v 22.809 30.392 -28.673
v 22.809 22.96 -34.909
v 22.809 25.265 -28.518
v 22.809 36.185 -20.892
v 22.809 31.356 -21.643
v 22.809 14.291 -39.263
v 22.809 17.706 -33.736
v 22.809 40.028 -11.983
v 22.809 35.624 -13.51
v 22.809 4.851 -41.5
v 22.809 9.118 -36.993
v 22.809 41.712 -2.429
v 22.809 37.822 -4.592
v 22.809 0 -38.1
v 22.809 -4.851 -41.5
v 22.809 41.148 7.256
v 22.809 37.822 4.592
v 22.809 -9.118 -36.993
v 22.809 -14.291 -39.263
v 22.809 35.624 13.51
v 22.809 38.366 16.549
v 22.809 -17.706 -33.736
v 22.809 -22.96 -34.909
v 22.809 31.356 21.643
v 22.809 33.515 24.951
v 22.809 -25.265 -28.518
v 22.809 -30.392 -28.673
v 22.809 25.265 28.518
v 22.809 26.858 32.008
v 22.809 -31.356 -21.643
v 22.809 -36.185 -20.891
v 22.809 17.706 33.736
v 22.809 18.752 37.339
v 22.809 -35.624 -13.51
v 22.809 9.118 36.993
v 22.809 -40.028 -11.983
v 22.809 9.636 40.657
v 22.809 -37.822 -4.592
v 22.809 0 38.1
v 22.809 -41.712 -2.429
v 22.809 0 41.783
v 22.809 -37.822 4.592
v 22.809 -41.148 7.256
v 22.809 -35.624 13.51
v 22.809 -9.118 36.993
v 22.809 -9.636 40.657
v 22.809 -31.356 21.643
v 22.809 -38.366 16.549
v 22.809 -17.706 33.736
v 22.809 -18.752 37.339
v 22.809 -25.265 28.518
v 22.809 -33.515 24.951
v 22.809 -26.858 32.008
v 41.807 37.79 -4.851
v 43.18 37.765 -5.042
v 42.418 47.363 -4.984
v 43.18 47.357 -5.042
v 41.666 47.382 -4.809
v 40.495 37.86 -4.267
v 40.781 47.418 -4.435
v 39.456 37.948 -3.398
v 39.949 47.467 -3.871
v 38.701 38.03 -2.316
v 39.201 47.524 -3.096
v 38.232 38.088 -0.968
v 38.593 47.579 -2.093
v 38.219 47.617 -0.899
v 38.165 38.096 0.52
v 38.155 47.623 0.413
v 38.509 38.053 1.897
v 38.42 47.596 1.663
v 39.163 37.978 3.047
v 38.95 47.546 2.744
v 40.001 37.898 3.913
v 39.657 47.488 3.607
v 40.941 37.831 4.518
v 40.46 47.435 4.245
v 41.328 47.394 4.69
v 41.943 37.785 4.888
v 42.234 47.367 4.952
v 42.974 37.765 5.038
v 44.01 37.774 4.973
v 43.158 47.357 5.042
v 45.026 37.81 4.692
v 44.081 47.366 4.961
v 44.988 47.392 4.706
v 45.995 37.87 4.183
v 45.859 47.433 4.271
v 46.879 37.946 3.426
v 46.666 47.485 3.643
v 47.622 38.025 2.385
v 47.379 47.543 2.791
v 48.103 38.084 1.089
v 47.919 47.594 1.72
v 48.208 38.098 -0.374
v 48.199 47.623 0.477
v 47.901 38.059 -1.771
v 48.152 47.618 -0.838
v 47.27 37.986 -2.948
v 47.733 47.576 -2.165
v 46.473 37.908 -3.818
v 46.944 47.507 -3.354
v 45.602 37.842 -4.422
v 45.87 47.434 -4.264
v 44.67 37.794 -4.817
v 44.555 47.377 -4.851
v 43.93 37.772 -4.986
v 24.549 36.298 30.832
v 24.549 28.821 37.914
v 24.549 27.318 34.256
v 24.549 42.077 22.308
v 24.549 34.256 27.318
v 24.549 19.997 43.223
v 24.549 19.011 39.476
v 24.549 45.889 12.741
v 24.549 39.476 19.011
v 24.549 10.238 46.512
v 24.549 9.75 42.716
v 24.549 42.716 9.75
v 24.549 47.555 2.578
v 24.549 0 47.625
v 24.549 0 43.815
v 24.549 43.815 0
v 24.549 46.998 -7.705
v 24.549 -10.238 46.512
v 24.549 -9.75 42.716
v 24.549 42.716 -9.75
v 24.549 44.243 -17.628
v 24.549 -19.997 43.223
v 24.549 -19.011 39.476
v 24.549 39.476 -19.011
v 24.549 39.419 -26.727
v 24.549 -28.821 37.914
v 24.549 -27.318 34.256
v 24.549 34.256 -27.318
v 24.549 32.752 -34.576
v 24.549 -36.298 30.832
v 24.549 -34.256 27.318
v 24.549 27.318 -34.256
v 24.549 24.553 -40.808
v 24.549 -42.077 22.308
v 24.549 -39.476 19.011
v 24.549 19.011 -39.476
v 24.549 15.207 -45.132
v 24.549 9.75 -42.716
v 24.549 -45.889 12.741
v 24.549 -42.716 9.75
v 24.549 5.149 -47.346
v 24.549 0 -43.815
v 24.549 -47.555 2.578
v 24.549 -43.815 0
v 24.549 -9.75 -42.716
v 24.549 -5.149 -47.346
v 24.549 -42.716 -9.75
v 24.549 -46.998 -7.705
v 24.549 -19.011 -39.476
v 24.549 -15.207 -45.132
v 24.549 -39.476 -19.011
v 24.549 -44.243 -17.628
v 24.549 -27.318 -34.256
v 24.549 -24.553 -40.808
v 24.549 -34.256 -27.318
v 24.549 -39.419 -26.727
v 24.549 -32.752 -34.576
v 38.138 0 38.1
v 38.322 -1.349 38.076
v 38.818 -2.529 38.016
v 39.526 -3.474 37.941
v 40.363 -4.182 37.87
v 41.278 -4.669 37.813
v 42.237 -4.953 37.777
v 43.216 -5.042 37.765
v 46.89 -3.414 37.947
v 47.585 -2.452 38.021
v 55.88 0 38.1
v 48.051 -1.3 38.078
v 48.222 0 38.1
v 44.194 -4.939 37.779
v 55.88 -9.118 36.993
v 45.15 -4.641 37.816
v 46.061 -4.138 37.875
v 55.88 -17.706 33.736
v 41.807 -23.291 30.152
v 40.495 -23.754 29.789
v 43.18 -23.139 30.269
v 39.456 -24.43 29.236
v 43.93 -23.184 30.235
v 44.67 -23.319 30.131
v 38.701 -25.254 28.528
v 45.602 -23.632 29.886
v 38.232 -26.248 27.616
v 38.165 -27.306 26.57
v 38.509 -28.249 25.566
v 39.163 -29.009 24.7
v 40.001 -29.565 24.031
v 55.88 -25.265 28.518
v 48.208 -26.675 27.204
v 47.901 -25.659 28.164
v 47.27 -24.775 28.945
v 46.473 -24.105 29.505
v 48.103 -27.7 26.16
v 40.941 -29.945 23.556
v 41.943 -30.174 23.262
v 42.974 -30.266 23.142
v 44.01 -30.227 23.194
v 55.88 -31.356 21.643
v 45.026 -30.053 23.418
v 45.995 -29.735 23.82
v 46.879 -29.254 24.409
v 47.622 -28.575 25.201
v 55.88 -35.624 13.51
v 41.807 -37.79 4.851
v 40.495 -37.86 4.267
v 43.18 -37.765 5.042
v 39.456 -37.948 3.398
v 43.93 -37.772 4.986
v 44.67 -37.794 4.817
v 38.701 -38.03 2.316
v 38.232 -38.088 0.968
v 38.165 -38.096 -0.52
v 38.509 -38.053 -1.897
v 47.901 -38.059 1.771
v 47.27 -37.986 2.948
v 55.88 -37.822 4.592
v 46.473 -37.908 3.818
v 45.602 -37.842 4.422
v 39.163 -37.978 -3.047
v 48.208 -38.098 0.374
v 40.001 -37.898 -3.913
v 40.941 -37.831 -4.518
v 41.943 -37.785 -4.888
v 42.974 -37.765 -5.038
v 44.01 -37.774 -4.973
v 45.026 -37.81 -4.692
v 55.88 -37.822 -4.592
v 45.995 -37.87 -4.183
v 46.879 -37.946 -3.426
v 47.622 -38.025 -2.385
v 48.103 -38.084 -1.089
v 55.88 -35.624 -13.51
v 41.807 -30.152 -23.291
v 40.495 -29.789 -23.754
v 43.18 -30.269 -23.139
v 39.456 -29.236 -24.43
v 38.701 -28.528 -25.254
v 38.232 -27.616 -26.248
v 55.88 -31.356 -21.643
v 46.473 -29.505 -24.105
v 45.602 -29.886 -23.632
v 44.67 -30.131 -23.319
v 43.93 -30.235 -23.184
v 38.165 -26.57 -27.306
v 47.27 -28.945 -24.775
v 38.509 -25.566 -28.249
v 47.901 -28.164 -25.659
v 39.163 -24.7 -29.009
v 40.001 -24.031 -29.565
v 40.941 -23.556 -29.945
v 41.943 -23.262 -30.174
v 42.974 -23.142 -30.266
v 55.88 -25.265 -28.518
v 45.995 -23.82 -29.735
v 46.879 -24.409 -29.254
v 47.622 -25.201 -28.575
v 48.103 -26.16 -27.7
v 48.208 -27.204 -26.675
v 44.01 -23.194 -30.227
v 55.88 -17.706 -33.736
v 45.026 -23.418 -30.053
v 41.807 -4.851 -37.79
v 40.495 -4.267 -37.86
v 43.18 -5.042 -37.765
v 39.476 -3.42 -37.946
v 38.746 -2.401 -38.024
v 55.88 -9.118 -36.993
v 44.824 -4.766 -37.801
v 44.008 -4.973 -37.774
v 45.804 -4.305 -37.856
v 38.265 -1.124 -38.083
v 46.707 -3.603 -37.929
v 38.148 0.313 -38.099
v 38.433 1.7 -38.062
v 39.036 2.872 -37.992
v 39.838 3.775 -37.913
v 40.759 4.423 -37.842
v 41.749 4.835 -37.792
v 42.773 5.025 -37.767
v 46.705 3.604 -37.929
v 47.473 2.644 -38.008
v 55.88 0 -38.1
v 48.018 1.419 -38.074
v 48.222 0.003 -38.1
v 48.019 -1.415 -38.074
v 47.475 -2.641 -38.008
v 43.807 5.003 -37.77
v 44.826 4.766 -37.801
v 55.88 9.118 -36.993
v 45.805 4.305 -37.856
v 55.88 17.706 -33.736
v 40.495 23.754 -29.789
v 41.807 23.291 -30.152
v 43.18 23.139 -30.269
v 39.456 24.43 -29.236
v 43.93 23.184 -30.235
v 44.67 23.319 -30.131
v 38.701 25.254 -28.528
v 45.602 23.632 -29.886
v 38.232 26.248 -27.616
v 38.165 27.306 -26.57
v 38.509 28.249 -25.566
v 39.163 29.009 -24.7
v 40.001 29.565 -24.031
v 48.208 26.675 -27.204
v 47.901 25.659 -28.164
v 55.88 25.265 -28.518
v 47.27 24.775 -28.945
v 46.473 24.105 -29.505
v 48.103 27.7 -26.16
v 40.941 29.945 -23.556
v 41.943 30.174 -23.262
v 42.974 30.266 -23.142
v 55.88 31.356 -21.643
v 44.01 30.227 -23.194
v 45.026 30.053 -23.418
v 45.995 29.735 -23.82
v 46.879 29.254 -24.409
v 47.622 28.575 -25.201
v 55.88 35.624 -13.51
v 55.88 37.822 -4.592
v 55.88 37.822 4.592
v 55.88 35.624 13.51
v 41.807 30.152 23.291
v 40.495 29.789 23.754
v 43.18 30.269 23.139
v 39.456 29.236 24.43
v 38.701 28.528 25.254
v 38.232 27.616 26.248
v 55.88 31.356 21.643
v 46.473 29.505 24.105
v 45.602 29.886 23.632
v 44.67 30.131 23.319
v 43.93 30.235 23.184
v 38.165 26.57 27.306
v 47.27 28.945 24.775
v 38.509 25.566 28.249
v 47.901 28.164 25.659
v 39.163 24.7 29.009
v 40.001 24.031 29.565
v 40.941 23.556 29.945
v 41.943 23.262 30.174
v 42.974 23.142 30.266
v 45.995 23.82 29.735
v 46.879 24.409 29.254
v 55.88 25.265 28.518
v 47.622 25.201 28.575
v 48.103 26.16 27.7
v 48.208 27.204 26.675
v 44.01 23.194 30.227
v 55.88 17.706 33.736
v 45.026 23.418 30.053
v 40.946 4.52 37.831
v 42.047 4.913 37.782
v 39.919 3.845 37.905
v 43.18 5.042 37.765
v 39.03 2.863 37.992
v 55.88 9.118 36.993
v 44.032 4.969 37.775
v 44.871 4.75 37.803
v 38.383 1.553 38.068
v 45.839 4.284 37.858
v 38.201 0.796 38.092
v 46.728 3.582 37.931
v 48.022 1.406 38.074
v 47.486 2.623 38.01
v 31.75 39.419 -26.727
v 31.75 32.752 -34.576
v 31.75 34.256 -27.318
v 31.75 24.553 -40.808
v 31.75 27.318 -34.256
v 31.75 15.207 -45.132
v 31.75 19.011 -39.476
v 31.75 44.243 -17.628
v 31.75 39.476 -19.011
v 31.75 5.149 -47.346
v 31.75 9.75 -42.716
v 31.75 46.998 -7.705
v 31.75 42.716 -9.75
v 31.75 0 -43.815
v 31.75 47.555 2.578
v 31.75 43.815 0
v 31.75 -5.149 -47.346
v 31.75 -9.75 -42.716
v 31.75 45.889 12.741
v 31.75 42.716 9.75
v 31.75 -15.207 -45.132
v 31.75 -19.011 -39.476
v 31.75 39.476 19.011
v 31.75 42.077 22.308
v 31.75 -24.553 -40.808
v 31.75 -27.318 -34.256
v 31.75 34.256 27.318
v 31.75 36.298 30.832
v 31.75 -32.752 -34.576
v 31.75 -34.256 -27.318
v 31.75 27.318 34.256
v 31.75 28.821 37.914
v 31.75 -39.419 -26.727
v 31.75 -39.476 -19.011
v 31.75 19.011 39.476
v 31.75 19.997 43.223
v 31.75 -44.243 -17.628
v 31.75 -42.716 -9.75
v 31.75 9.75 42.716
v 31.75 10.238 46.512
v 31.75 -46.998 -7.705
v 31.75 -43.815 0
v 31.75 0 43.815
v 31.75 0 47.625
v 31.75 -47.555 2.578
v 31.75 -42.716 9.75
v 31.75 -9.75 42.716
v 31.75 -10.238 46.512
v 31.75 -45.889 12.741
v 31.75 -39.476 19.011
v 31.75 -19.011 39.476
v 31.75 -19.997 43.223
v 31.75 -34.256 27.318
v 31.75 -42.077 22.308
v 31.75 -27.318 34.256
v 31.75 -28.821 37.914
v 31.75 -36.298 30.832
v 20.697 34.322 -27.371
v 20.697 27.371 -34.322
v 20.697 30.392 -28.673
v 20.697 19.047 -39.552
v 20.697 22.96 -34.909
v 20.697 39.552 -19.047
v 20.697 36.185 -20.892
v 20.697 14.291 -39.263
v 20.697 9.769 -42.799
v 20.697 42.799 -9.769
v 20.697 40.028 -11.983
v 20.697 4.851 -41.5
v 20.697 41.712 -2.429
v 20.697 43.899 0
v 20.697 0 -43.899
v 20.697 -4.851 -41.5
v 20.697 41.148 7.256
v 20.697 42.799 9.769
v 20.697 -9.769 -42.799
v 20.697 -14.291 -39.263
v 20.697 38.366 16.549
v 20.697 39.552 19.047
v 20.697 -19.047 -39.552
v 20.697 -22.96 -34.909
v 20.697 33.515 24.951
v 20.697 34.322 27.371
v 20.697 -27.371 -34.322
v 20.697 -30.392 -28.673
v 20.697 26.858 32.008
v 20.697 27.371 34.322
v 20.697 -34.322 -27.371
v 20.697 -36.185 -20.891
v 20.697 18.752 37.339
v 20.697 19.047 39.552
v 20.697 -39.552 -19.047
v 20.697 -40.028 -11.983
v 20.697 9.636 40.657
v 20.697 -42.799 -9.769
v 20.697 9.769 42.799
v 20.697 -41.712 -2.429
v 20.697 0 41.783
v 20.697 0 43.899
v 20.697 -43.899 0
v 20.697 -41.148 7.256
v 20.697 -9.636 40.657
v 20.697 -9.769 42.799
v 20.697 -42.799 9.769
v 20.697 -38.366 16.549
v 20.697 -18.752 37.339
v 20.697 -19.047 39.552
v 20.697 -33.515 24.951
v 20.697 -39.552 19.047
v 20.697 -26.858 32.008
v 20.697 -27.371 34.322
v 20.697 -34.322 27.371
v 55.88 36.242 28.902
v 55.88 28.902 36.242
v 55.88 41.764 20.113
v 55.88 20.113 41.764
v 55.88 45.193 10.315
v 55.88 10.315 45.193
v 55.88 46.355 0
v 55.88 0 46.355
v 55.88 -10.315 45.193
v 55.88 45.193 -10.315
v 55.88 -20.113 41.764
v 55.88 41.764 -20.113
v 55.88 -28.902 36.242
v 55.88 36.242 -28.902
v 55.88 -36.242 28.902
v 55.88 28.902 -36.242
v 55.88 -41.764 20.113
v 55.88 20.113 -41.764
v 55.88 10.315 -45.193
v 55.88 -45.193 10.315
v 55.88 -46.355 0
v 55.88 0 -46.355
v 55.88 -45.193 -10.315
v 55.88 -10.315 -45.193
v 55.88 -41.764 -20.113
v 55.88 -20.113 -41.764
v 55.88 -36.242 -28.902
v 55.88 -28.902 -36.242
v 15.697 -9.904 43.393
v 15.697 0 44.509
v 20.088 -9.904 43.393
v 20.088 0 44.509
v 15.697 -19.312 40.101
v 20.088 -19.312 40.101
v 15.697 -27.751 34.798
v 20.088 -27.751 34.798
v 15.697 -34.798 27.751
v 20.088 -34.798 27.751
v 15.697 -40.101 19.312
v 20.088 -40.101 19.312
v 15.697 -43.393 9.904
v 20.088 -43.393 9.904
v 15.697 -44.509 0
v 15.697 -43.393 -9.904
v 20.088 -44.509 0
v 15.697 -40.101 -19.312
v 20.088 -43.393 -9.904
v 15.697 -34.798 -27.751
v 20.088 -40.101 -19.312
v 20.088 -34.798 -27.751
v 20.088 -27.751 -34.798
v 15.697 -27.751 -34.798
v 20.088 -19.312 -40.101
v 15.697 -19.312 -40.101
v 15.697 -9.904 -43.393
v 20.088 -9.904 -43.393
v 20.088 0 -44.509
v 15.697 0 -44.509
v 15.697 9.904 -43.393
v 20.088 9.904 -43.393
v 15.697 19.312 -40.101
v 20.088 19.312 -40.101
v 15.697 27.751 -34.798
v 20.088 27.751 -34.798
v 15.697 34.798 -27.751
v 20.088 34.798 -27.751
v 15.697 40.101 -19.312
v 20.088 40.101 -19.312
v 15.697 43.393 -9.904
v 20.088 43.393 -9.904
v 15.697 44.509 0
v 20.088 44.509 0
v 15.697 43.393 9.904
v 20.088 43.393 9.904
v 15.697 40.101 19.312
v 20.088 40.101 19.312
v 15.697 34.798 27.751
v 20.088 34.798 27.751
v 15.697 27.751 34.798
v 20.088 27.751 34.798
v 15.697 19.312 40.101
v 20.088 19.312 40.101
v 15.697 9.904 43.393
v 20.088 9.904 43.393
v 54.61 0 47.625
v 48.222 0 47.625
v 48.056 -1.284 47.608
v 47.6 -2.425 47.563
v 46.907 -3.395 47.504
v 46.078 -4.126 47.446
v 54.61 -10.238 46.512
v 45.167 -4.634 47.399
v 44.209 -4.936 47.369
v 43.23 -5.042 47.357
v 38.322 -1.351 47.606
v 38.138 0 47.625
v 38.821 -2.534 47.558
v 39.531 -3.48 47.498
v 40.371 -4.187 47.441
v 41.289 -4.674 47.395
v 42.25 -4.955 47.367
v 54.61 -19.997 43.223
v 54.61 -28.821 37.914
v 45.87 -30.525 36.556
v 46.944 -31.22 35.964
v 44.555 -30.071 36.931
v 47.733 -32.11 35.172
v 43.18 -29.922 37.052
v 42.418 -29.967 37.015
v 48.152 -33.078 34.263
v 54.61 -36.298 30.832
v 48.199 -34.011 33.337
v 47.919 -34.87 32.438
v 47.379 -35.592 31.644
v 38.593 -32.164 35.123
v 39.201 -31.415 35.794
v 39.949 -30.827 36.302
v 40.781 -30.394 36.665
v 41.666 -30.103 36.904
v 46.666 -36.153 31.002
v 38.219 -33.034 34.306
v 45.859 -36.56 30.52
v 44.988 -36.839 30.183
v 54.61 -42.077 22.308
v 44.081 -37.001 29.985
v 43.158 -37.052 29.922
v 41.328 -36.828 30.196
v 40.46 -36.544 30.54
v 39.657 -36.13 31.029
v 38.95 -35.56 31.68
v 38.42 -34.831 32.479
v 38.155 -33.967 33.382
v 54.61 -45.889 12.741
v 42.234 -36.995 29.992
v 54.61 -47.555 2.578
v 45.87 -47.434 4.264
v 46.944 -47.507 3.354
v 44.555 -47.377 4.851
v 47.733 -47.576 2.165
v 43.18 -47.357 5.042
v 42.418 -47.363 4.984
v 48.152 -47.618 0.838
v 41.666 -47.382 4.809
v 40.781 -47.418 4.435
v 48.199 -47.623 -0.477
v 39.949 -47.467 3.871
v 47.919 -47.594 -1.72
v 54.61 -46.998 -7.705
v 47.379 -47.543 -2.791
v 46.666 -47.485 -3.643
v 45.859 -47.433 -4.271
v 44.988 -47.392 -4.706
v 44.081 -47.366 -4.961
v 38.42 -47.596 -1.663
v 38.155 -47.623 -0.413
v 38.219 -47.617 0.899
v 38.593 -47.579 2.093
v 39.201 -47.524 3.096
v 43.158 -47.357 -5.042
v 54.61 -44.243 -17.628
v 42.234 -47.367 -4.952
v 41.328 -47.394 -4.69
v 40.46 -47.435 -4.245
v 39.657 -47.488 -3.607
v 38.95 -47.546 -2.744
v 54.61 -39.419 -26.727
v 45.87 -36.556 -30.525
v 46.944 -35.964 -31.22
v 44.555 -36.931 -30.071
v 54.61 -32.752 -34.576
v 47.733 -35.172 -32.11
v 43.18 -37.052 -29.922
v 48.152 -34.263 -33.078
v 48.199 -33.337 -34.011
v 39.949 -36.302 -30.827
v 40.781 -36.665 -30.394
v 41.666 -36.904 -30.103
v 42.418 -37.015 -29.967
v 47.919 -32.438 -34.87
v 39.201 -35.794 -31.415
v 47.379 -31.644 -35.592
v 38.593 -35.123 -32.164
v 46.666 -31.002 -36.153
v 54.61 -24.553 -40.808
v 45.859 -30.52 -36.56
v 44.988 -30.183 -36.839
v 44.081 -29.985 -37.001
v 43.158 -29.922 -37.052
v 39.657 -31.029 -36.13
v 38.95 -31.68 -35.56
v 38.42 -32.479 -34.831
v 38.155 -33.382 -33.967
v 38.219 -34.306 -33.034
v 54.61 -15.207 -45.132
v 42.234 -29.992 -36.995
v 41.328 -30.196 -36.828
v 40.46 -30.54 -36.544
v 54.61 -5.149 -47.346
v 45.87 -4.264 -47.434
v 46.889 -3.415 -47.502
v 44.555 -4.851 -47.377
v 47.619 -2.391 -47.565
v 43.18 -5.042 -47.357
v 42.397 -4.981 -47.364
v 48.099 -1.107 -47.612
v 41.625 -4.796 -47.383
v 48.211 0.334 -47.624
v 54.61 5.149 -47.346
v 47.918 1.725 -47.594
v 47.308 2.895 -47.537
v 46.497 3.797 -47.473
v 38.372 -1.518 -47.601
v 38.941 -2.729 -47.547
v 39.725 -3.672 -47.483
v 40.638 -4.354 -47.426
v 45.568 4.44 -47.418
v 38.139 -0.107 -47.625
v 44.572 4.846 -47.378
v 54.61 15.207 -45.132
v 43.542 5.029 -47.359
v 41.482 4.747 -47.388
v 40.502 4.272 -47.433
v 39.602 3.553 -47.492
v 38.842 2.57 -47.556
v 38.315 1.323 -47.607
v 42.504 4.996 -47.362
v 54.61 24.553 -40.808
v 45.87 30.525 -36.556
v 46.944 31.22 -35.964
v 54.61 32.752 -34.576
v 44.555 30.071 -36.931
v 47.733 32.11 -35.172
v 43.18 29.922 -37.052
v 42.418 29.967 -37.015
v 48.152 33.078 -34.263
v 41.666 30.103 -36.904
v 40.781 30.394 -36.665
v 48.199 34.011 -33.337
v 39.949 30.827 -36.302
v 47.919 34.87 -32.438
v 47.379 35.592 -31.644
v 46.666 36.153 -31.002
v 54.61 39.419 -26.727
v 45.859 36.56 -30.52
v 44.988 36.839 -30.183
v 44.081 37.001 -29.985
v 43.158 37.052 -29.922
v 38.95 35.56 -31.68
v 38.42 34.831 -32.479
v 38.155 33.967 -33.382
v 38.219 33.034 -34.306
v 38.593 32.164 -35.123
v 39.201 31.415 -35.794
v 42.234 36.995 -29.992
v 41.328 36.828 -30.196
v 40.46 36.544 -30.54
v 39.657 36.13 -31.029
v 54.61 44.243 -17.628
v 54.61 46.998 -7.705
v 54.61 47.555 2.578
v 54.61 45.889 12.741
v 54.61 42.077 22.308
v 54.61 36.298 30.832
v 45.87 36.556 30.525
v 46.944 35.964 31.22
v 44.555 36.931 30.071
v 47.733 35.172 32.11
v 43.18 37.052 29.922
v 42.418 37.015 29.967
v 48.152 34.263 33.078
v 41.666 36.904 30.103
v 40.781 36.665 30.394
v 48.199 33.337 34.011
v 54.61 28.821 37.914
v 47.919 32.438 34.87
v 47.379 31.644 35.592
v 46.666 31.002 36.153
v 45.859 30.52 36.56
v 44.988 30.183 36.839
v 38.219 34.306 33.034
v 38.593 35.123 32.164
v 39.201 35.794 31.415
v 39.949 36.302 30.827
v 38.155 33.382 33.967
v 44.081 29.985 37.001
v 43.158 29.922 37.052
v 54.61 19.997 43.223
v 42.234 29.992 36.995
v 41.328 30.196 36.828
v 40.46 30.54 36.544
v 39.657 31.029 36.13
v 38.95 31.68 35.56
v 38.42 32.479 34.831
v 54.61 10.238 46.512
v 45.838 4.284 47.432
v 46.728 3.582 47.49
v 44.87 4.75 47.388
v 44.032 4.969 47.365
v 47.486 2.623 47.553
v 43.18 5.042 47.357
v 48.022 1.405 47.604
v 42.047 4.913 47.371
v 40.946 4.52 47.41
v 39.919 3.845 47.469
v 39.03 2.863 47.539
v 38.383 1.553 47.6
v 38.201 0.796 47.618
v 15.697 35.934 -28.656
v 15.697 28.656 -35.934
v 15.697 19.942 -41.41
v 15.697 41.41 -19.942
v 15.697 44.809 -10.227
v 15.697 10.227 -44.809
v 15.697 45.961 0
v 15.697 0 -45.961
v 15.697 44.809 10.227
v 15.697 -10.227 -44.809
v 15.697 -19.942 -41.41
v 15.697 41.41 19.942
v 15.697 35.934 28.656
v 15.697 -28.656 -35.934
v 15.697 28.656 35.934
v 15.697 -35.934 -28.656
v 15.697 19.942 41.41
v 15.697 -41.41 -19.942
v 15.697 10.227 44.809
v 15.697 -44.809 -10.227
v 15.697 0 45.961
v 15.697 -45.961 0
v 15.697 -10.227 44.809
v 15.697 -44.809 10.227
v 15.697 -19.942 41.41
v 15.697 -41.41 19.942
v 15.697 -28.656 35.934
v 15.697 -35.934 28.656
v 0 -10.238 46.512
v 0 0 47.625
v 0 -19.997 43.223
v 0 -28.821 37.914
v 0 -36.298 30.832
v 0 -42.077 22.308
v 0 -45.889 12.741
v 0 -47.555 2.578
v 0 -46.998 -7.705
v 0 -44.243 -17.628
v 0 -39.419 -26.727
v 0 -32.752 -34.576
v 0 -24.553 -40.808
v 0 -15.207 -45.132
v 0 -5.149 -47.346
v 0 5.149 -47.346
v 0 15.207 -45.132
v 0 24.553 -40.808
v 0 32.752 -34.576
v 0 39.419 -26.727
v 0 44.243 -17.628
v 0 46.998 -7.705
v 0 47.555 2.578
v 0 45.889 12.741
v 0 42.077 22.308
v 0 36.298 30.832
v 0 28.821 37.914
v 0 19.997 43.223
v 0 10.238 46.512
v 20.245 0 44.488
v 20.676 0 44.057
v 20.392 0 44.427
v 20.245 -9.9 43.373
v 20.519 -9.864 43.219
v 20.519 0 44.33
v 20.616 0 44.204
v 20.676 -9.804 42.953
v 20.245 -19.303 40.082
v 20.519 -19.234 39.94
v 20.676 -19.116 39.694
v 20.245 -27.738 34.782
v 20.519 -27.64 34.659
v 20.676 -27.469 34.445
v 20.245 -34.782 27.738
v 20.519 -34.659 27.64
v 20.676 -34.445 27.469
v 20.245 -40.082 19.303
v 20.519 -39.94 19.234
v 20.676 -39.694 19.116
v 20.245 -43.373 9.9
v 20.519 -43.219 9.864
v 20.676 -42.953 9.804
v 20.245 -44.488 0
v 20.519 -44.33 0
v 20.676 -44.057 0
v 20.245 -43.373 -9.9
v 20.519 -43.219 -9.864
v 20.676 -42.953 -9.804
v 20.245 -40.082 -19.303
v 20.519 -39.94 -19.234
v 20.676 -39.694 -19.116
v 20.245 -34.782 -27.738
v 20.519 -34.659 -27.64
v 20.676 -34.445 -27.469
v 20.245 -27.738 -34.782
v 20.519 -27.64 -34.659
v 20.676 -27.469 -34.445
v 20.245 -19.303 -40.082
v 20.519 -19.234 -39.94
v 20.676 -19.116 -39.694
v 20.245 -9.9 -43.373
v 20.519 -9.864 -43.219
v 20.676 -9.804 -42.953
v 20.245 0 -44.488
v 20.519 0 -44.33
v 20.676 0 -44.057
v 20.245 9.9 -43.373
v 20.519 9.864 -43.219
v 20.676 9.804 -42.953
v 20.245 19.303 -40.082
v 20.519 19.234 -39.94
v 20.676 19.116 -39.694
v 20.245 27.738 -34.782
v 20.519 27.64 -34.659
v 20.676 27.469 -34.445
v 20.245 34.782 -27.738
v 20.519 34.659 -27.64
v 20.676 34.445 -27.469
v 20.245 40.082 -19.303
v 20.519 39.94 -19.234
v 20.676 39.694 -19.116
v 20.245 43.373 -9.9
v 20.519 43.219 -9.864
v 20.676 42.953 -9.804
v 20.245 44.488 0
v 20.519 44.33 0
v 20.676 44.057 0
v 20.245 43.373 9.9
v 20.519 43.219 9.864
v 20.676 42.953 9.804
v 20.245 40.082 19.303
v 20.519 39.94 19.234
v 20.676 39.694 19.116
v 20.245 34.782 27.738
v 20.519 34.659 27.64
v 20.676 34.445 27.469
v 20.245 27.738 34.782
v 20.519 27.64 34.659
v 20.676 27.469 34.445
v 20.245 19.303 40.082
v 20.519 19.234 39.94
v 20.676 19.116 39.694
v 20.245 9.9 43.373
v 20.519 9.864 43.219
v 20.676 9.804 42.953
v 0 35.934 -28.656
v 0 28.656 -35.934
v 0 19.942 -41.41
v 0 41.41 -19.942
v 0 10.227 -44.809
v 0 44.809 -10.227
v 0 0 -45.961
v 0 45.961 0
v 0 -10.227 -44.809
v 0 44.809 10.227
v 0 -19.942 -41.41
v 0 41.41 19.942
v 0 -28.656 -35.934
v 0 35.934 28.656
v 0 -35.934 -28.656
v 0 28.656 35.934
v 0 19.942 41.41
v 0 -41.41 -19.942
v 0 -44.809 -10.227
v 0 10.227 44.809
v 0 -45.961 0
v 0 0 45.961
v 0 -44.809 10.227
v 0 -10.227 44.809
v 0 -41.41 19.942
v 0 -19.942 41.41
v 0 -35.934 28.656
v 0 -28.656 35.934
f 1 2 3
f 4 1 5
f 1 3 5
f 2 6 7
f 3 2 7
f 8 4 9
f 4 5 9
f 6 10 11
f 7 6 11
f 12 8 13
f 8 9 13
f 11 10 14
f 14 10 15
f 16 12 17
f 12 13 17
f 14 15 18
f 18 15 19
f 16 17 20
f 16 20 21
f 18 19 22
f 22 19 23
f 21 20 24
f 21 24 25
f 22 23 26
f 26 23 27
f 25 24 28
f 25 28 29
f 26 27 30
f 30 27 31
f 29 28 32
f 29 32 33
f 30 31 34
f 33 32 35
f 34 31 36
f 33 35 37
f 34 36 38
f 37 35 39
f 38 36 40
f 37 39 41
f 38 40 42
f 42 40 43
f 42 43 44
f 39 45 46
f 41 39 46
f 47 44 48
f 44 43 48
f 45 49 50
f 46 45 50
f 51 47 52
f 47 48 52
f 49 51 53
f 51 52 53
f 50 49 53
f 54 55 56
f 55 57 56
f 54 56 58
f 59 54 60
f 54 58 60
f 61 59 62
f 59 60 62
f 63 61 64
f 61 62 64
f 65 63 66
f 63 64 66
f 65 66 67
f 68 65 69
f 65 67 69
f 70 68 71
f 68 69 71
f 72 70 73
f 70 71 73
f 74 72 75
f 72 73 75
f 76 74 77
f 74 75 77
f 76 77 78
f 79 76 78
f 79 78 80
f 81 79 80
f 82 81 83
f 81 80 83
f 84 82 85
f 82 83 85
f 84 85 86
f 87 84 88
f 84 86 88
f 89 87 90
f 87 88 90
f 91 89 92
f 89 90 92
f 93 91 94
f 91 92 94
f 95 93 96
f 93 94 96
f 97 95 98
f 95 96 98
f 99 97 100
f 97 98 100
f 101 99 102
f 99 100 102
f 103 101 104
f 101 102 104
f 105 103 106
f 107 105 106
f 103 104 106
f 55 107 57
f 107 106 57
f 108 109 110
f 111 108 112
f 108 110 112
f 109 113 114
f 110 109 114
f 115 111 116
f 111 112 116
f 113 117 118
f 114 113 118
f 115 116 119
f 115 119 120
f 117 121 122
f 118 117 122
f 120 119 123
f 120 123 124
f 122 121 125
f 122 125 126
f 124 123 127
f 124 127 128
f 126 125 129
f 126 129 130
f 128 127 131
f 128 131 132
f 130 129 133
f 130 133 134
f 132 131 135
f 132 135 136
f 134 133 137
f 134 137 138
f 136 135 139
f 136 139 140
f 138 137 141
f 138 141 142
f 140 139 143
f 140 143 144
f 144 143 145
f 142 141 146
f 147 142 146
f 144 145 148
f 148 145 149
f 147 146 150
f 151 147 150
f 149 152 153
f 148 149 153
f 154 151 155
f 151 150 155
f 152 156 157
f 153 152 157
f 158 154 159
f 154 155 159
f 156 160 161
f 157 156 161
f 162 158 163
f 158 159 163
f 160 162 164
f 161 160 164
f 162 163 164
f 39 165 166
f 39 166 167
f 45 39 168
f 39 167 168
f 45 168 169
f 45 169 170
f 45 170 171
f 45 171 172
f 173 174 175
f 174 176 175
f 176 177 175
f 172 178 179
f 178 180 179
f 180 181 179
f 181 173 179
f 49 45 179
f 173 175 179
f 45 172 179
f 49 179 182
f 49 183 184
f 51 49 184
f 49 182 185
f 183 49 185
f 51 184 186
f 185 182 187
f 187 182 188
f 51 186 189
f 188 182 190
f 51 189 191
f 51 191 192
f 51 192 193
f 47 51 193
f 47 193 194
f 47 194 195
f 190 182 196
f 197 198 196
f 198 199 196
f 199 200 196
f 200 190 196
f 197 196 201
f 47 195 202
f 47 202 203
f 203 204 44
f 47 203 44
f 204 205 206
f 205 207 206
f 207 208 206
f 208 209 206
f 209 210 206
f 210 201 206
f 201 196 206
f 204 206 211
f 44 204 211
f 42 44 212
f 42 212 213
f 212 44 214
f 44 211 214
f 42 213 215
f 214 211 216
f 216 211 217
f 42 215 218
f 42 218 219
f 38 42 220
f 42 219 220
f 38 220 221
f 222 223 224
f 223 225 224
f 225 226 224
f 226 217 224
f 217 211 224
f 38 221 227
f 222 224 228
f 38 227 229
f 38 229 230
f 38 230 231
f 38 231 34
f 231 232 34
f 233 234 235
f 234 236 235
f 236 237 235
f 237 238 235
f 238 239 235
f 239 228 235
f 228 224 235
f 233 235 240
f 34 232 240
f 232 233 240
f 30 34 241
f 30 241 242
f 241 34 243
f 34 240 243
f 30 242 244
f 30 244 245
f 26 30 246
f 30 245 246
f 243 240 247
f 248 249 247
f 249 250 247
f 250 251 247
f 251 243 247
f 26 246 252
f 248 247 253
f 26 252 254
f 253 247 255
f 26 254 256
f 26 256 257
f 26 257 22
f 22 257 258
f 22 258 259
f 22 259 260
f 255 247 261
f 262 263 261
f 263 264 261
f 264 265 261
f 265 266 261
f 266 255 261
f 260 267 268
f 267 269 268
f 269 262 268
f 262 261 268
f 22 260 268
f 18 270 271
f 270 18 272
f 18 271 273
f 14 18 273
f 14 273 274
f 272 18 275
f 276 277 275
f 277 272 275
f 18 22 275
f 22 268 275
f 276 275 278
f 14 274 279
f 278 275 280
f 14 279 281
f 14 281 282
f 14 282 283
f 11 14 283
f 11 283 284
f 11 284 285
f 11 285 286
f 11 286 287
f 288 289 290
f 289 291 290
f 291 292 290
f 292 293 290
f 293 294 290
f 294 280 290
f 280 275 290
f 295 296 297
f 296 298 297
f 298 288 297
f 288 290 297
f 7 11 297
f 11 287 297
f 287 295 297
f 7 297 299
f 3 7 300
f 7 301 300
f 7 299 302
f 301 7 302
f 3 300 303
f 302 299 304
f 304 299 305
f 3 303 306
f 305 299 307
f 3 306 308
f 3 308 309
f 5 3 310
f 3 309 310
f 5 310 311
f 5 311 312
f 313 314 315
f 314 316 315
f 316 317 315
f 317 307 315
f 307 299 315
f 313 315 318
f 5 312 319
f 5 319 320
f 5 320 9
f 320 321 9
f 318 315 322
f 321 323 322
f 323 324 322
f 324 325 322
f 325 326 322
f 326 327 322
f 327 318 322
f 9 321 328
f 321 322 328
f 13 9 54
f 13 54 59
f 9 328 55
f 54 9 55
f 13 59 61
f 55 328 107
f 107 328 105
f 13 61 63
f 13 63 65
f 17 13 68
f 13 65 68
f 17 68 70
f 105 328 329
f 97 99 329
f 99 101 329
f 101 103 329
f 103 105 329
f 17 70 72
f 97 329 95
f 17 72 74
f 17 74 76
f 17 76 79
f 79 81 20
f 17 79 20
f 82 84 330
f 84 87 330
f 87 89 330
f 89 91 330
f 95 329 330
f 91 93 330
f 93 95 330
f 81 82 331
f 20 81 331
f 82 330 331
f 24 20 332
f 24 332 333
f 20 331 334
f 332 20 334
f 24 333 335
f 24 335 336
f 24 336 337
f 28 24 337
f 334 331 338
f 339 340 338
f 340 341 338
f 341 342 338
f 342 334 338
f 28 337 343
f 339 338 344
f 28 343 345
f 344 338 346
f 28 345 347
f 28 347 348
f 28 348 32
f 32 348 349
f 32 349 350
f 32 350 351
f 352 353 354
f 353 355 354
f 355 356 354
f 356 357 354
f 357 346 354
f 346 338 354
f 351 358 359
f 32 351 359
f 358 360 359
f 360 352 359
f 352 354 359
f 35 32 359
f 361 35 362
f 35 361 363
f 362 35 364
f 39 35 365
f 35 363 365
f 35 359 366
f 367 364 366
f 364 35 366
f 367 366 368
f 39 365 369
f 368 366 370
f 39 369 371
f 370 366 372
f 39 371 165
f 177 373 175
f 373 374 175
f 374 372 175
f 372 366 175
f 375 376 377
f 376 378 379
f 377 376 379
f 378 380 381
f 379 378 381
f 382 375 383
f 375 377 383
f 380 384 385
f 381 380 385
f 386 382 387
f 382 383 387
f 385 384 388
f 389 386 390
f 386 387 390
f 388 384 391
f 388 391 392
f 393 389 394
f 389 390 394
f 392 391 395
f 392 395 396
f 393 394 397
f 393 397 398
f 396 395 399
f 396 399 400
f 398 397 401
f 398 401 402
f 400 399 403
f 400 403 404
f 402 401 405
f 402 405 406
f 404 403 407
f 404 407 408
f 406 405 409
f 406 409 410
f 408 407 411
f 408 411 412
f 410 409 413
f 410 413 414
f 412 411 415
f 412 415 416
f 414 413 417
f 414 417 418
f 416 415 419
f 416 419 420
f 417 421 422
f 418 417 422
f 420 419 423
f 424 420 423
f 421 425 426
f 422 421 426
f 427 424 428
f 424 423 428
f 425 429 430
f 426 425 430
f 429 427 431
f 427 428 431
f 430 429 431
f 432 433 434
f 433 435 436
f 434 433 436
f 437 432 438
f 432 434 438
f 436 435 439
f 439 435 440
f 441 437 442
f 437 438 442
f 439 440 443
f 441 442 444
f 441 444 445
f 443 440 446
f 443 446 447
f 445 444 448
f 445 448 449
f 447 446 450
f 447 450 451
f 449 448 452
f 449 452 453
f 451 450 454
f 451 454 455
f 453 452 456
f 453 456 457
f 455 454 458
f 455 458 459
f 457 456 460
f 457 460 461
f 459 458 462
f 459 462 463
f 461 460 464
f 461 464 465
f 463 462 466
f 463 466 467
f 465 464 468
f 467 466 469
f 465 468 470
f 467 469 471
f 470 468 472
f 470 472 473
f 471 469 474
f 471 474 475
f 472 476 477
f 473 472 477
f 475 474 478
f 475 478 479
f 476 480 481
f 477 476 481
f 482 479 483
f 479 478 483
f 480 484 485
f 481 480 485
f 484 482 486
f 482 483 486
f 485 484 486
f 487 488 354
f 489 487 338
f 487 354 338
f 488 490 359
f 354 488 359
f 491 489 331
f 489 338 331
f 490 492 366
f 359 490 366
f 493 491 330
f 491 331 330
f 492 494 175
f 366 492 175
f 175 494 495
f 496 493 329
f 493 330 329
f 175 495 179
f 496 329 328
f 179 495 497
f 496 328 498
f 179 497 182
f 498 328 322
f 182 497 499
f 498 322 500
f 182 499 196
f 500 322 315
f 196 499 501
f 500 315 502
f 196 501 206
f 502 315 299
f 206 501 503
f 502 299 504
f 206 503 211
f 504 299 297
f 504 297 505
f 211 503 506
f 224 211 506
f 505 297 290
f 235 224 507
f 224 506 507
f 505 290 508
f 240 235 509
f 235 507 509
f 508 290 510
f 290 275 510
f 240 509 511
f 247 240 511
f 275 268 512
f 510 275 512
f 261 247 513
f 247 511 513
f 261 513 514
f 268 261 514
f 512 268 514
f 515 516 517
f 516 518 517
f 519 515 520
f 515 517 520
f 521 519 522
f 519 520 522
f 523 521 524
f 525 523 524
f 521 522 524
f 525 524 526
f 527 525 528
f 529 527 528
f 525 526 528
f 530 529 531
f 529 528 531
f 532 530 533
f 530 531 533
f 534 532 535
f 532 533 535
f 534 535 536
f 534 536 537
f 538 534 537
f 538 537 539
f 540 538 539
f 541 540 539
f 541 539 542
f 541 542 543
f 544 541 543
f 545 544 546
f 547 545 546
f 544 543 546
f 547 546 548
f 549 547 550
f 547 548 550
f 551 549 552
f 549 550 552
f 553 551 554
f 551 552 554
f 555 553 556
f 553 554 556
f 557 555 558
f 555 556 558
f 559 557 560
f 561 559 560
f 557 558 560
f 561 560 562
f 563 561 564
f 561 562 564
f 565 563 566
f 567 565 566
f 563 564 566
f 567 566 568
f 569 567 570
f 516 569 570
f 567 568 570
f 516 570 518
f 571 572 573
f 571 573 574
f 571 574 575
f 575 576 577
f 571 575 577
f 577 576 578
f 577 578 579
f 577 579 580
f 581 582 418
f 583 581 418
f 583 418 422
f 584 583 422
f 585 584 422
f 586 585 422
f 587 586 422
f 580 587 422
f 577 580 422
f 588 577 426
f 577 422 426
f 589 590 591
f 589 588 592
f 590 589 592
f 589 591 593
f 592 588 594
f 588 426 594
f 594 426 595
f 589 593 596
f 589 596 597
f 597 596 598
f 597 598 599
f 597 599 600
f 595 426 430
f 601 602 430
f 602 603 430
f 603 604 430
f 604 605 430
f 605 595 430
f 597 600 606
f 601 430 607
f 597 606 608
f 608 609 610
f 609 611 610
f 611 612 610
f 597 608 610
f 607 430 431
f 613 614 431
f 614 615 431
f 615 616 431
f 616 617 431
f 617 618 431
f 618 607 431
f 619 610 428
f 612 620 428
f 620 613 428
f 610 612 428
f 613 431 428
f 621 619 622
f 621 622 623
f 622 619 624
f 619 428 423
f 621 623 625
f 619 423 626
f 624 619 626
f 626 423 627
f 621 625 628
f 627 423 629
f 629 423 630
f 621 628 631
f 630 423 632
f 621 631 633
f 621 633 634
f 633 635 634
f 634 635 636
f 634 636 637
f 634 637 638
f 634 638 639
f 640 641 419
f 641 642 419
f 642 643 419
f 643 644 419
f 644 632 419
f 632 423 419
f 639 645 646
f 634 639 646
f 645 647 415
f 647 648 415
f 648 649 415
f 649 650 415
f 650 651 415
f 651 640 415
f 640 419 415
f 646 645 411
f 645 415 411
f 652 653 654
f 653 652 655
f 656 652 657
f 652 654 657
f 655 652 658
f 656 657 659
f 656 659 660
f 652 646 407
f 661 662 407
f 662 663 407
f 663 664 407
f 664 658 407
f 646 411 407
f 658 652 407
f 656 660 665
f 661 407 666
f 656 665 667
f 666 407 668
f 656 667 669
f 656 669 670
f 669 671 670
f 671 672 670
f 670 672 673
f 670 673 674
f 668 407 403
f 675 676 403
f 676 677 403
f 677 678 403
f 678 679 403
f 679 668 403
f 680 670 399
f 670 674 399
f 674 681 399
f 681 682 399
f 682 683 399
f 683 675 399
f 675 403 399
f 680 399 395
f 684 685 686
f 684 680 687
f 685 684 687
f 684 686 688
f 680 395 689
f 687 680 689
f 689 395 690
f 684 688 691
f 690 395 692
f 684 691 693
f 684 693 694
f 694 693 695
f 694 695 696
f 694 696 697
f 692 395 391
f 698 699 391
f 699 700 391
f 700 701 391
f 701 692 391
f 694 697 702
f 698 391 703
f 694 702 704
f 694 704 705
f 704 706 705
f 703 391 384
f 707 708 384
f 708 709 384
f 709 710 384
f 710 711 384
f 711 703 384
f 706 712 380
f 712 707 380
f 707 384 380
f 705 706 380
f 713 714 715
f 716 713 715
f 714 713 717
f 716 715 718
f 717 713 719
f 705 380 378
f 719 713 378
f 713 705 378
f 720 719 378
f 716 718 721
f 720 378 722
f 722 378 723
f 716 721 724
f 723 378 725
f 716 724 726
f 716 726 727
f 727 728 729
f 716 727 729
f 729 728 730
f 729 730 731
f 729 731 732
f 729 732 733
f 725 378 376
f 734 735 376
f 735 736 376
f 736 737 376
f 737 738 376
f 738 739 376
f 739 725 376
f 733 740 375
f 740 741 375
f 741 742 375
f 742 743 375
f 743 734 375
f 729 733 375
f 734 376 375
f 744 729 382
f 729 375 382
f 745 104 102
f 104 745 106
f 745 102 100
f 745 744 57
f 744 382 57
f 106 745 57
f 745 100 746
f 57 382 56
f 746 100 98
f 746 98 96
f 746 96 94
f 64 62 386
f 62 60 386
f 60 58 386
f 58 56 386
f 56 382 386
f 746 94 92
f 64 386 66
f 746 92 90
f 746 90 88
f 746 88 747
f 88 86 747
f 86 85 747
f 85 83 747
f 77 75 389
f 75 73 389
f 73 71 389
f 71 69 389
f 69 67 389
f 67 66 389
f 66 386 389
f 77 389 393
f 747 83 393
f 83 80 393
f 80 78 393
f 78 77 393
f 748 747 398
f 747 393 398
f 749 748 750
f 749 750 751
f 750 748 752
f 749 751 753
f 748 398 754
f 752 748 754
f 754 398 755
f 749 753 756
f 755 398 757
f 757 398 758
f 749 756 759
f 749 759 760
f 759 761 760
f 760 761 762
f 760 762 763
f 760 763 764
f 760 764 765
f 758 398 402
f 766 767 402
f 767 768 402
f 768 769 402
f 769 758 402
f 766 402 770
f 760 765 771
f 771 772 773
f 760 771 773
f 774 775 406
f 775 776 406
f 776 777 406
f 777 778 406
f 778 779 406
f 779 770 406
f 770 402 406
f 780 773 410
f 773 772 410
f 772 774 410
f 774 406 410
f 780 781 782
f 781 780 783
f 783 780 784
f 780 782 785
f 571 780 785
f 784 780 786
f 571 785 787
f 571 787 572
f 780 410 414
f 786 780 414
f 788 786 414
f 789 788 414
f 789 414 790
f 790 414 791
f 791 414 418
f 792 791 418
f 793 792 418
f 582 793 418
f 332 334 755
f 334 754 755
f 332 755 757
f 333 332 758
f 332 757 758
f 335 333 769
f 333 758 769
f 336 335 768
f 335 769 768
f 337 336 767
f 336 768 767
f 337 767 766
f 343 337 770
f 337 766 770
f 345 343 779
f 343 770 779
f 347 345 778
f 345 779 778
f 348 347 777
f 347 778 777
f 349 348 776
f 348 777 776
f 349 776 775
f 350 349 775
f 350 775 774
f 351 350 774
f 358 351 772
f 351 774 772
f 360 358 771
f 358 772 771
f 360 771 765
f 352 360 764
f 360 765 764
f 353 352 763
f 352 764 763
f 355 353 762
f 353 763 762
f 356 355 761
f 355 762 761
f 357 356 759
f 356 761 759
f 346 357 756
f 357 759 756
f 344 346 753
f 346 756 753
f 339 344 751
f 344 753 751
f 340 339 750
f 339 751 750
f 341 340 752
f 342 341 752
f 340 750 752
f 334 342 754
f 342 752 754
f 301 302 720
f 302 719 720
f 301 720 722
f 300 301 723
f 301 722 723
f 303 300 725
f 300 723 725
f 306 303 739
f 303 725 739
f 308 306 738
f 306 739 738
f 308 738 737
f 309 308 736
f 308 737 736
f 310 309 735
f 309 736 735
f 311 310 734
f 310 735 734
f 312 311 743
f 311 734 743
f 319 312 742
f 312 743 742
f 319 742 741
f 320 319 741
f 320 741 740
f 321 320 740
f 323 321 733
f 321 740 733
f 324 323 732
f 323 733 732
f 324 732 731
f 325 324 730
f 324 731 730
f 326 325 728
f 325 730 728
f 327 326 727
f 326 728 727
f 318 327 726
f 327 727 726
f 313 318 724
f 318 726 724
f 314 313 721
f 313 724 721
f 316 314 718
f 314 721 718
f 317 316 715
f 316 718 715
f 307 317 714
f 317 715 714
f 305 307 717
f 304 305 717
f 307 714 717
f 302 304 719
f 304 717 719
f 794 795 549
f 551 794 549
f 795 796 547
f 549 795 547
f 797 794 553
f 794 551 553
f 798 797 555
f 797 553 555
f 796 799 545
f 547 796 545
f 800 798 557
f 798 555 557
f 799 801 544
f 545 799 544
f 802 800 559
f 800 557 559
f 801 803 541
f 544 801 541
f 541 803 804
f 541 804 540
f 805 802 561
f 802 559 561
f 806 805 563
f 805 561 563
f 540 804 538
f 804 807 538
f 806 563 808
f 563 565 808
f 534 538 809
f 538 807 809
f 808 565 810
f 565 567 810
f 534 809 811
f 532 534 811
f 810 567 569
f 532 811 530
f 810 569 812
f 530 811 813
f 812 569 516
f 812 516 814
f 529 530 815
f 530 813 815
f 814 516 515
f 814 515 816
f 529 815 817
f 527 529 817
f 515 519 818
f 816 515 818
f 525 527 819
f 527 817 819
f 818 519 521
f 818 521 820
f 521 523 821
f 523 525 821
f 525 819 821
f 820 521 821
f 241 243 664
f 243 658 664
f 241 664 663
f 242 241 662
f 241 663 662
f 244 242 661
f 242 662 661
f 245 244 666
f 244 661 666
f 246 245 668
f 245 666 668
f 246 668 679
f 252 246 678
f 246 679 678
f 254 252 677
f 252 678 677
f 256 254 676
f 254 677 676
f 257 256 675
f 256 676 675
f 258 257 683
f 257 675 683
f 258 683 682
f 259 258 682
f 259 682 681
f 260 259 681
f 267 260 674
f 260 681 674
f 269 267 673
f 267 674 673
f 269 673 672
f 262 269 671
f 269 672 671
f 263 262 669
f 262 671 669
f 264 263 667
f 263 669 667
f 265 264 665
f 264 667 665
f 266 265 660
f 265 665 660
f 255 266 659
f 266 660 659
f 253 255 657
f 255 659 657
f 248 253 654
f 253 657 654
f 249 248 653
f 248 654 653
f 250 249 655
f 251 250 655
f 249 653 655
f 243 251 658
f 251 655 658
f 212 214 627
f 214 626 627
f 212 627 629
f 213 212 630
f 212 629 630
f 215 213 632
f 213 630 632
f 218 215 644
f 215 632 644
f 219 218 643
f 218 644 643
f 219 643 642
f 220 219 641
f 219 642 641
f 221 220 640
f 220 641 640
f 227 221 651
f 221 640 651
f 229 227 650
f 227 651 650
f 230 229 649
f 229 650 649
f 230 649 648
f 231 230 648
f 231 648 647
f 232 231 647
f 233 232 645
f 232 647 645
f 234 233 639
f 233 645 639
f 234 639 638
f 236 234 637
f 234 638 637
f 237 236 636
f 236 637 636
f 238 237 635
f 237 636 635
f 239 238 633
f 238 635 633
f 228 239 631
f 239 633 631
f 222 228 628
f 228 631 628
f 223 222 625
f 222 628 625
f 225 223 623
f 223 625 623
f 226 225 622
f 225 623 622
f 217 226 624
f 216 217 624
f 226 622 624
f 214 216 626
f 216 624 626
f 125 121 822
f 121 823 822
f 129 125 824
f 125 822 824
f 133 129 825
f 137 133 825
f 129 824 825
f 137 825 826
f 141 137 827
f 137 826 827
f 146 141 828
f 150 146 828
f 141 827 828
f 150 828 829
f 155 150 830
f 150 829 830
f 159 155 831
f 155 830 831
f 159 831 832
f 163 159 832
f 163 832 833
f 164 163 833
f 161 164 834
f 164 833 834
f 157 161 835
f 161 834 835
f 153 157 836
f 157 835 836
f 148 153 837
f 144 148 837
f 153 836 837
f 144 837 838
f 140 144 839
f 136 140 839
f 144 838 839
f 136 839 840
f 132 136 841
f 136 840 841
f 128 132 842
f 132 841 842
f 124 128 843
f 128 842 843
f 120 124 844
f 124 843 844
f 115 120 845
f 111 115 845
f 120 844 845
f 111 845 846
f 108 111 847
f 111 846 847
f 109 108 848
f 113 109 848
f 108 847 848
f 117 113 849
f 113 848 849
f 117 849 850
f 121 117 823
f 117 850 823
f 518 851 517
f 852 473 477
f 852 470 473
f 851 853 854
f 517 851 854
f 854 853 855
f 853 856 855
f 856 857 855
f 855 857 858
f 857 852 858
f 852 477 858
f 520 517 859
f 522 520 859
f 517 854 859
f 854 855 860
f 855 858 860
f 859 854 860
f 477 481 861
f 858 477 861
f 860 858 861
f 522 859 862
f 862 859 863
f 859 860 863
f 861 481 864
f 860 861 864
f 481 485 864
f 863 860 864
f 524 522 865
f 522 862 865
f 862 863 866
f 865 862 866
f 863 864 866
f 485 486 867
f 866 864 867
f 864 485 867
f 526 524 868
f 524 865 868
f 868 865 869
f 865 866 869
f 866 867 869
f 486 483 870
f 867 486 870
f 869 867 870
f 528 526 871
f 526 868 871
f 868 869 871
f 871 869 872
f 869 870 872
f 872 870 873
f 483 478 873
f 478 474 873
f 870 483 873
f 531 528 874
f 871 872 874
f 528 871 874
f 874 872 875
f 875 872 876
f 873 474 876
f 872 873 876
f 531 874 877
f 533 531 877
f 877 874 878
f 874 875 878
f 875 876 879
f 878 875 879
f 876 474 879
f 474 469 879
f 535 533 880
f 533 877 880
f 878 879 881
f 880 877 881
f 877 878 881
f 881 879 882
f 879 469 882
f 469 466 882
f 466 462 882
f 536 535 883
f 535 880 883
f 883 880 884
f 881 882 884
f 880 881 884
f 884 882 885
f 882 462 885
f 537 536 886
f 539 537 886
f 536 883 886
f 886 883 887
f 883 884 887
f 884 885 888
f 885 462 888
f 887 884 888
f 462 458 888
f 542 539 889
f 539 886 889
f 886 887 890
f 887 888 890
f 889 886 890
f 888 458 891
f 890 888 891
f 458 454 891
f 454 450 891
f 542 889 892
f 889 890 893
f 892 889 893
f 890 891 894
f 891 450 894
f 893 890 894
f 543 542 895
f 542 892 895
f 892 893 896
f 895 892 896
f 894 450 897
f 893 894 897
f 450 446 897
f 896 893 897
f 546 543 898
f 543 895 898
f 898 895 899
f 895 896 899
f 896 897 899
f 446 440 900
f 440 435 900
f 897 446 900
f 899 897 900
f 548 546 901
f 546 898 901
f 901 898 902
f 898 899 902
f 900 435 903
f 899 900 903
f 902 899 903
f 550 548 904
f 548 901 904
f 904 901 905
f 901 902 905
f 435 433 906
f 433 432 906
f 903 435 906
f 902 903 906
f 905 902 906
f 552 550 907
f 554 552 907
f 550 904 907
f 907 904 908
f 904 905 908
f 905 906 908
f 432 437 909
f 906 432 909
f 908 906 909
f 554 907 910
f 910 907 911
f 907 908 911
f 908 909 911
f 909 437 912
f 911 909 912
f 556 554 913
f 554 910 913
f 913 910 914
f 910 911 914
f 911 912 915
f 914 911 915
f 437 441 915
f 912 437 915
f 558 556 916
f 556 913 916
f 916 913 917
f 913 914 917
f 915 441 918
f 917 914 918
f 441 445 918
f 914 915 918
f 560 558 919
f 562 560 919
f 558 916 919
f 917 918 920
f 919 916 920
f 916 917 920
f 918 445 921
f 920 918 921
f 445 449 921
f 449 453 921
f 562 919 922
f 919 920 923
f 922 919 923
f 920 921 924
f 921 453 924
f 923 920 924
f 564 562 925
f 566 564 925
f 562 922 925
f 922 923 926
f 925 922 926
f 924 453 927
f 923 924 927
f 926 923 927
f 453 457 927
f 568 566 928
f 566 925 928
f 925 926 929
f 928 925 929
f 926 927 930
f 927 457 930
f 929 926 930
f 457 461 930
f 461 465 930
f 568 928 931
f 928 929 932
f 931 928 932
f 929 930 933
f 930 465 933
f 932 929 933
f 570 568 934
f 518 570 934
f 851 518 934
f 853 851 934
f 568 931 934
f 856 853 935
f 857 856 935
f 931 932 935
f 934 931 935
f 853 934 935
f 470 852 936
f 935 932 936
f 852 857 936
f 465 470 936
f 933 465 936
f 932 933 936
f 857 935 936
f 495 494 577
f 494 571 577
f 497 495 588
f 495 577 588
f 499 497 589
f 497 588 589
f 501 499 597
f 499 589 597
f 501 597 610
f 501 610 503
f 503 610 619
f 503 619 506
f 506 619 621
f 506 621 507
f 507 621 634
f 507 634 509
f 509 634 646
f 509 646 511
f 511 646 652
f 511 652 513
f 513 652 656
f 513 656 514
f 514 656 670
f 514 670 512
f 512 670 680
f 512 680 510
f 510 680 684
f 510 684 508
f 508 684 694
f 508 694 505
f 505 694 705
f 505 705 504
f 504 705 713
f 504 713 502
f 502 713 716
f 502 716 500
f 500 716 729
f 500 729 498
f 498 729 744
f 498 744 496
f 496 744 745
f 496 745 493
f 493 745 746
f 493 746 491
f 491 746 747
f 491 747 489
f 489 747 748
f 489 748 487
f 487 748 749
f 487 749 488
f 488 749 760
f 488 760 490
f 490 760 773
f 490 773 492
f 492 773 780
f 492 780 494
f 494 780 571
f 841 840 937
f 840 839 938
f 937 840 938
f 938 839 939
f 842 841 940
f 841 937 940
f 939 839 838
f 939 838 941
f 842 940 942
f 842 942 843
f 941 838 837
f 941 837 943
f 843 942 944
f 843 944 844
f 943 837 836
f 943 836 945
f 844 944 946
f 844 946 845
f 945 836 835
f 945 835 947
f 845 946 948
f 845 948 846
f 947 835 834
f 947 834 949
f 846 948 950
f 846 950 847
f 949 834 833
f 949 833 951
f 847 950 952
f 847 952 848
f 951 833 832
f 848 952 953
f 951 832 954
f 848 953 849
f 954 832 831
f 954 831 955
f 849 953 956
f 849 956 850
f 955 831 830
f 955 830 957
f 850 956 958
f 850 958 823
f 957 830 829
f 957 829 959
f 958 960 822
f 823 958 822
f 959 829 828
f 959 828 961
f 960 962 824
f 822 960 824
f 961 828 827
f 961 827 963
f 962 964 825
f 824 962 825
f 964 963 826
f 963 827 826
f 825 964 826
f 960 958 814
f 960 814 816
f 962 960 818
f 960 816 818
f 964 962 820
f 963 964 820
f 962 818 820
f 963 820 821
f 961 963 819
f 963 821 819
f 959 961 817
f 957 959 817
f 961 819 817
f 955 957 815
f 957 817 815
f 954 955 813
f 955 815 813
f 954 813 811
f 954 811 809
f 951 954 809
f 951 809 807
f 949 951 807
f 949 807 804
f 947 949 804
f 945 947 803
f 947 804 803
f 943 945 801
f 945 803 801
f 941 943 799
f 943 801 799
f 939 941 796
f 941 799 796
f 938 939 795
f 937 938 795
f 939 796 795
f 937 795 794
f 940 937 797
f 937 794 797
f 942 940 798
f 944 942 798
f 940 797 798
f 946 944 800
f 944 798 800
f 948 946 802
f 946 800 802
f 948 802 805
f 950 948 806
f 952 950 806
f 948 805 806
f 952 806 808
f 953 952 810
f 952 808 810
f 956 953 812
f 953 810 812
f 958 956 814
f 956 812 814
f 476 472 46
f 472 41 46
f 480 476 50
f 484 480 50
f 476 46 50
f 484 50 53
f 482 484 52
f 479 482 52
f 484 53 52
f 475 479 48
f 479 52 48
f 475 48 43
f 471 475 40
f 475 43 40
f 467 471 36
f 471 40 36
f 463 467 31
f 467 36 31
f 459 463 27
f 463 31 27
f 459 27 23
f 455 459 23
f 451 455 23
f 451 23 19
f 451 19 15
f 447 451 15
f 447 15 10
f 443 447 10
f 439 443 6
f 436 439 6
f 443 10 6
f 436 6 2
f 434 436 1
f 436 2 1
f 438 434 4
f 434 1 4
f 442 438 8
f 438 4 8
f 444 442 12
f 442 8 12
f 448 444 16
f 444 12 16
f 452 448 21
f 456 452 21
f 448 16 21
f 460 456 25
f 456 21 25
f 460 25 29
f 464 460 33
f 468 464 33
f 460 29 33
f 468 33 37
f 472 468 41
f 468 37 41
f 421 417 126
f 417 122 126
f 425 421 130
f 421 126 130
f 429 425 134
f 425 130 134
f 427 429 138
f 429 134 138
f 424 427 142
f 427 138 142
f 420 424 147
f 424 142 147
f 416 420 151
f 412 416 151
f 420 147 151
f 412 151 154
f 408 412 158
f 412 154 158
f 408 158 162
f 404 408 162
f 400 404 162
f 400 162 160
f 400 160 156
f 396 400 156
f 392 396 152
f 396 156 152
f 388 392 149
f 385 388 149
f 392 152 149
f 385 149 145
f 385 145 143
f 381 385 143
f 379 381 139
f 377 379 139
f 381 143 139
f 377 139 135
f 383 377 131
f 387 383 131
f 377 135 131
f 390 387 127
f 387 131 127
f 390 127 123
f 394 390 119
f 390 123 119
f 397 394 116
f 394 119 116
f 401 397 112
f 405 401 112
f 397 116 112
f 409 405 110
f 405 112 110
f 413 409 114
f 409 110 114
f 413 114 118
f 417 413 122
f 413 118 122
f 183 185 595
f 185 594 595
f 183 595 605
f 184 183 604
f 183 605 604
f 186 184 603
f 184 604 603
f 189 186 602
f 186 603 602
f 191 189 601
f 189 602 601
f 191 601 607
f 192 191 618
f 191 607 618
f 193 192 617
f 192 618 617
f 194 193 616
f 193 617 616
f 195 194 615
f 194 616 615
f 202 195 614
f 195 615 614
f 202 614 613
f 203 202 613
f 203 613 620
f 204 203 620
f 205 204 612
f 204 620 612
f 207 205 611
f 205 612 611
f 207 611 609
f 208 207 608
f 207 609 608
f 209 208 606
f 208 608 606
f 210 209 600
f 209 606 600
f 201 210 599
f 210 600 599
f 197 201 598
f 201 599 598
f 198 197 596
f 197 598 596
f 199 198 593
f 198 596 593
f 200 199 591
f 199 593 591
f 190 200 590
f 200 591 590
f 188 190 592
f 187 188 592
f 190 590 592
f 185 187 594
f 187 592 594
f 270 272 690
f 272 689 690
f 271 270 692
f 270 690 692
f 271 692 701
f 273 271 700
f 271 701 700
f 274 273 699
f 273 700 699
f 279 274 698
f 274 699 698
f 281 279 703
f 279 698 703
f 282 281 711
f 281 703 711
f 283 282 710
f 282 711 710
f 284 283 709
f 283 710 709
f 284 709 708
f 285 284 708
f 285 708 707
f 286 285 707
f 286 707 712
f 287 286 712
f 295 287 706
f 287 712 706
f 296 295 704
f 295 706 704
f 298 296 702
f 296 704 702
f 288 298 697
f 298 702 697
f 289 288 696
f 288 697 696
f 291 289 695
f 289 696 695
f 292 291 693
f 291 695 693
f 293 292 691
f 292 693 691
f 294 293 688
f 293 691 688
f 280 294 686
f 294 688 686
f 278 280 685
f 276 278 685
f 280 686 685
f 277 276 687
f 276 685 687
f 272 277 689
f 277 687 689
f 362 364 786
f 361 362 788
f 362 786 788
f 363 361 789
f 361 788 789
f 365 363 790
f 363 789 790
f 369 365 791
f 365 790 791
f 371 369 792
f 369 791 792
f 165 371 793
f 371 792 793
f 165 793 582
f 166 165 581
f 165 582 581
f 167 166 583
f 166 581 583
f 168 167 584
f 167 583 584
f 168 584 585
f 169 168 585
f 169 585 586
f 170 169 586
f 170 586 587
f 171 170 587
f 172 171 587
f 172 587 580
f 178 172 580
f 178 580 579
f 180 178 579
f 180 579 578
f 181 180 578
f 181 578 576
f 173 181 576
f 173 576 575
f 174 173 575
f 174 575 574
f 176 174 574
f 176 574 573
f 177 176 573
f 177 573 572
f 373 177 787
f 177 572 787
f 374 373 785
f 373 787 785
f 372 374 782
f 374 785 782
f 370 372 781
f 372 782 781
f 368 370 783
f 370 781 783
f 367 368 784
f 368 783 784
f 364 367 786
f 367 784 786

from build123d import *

# Parameters (mm, degrees)
SKETCH4_W         = 5.0419
SKETCH4_H         = 47.625
CIRPATTERN1_COUNT = 8


with BuildPart() as part:
    # Sketch1 → Revolve1 (revolve)
    with BuildSketch(Plane.XY, mode=Mode.PRIVATE) as revolve1_sk:
        with BuildLine():
            Line((0, 45.9613), (15.6972, 45.9613))
            Line((15.6972, 45.9613), (15.6972, 44.508928))
            Line((15.6972, 44.508928), (20.08759, 44.508928))
            ThreePointArc((20.08759, 44.508928), (20.518642294, 44.330380294), (20.69719, 43.899328))
            Line((20.69719, 43.899328), (20.69719, 41.783))
            Line((20.69719, 41.783), (22.8092, 41.783))
            Line((22.8092, 41.783), (22.8092, 38.1))
            Line((22.8092, 38.1), (55.88, 38.1))
            Line((55.88, 38.1), (55.88, 46.355))
            Line((55.88, 46.355), (54.61, 47.625))
            Line((54.61, 47.625), (31.75, 47.625))
            Line((31.75, 47.625), (31.75, 43.815))
            Line((31.75, 43.815), (24.5491, 43.815))
            Line((24.5491, 43.815), (24.5491, 47.625))
            Line((24.5491, 47.625), (0, 47.625))
            Line((0, 47.625), (0, 45.9613))
        make_face()
    revolve(revolve1_sk.sketch.rotate(Axis((0, 0, 0), (1, 0, 0)), 90), axis=Axis((0, 0, 0), (1, 0, 0)))

    # Sketch4 → Tap Drill for 3/8 Helicoil1 (revolve, cut)
    with BuildSketch(Plane.YZ.offset(43.18)):
        with Locations((2.52095, 23.8125)):
            Rectangle(SKETCH4_W, SKETCH4_H)
    tap_drill_for_3_8_helicoil1 = revolve(axis=Axis((43.18, 0, -6.35), (0, 0, 1)), mode=Mode.SUBTRACT)

    # CirPattern1: Tap Drill for 3/8 Helicoil1 ×8 about axis
    cirpattern1_axis = Axis((54.61, 0, 0), (-1, 0, 0))
    for i in range(1, CIRPATTERN1_COUNT):
        add(tap_drill_for_3_8_helicoil1.rotate(cirpattern1_axis, i * 360 / CIRPATTERN1_COUNT), mode=Mode.SUBTRACT)


solid = part.part
